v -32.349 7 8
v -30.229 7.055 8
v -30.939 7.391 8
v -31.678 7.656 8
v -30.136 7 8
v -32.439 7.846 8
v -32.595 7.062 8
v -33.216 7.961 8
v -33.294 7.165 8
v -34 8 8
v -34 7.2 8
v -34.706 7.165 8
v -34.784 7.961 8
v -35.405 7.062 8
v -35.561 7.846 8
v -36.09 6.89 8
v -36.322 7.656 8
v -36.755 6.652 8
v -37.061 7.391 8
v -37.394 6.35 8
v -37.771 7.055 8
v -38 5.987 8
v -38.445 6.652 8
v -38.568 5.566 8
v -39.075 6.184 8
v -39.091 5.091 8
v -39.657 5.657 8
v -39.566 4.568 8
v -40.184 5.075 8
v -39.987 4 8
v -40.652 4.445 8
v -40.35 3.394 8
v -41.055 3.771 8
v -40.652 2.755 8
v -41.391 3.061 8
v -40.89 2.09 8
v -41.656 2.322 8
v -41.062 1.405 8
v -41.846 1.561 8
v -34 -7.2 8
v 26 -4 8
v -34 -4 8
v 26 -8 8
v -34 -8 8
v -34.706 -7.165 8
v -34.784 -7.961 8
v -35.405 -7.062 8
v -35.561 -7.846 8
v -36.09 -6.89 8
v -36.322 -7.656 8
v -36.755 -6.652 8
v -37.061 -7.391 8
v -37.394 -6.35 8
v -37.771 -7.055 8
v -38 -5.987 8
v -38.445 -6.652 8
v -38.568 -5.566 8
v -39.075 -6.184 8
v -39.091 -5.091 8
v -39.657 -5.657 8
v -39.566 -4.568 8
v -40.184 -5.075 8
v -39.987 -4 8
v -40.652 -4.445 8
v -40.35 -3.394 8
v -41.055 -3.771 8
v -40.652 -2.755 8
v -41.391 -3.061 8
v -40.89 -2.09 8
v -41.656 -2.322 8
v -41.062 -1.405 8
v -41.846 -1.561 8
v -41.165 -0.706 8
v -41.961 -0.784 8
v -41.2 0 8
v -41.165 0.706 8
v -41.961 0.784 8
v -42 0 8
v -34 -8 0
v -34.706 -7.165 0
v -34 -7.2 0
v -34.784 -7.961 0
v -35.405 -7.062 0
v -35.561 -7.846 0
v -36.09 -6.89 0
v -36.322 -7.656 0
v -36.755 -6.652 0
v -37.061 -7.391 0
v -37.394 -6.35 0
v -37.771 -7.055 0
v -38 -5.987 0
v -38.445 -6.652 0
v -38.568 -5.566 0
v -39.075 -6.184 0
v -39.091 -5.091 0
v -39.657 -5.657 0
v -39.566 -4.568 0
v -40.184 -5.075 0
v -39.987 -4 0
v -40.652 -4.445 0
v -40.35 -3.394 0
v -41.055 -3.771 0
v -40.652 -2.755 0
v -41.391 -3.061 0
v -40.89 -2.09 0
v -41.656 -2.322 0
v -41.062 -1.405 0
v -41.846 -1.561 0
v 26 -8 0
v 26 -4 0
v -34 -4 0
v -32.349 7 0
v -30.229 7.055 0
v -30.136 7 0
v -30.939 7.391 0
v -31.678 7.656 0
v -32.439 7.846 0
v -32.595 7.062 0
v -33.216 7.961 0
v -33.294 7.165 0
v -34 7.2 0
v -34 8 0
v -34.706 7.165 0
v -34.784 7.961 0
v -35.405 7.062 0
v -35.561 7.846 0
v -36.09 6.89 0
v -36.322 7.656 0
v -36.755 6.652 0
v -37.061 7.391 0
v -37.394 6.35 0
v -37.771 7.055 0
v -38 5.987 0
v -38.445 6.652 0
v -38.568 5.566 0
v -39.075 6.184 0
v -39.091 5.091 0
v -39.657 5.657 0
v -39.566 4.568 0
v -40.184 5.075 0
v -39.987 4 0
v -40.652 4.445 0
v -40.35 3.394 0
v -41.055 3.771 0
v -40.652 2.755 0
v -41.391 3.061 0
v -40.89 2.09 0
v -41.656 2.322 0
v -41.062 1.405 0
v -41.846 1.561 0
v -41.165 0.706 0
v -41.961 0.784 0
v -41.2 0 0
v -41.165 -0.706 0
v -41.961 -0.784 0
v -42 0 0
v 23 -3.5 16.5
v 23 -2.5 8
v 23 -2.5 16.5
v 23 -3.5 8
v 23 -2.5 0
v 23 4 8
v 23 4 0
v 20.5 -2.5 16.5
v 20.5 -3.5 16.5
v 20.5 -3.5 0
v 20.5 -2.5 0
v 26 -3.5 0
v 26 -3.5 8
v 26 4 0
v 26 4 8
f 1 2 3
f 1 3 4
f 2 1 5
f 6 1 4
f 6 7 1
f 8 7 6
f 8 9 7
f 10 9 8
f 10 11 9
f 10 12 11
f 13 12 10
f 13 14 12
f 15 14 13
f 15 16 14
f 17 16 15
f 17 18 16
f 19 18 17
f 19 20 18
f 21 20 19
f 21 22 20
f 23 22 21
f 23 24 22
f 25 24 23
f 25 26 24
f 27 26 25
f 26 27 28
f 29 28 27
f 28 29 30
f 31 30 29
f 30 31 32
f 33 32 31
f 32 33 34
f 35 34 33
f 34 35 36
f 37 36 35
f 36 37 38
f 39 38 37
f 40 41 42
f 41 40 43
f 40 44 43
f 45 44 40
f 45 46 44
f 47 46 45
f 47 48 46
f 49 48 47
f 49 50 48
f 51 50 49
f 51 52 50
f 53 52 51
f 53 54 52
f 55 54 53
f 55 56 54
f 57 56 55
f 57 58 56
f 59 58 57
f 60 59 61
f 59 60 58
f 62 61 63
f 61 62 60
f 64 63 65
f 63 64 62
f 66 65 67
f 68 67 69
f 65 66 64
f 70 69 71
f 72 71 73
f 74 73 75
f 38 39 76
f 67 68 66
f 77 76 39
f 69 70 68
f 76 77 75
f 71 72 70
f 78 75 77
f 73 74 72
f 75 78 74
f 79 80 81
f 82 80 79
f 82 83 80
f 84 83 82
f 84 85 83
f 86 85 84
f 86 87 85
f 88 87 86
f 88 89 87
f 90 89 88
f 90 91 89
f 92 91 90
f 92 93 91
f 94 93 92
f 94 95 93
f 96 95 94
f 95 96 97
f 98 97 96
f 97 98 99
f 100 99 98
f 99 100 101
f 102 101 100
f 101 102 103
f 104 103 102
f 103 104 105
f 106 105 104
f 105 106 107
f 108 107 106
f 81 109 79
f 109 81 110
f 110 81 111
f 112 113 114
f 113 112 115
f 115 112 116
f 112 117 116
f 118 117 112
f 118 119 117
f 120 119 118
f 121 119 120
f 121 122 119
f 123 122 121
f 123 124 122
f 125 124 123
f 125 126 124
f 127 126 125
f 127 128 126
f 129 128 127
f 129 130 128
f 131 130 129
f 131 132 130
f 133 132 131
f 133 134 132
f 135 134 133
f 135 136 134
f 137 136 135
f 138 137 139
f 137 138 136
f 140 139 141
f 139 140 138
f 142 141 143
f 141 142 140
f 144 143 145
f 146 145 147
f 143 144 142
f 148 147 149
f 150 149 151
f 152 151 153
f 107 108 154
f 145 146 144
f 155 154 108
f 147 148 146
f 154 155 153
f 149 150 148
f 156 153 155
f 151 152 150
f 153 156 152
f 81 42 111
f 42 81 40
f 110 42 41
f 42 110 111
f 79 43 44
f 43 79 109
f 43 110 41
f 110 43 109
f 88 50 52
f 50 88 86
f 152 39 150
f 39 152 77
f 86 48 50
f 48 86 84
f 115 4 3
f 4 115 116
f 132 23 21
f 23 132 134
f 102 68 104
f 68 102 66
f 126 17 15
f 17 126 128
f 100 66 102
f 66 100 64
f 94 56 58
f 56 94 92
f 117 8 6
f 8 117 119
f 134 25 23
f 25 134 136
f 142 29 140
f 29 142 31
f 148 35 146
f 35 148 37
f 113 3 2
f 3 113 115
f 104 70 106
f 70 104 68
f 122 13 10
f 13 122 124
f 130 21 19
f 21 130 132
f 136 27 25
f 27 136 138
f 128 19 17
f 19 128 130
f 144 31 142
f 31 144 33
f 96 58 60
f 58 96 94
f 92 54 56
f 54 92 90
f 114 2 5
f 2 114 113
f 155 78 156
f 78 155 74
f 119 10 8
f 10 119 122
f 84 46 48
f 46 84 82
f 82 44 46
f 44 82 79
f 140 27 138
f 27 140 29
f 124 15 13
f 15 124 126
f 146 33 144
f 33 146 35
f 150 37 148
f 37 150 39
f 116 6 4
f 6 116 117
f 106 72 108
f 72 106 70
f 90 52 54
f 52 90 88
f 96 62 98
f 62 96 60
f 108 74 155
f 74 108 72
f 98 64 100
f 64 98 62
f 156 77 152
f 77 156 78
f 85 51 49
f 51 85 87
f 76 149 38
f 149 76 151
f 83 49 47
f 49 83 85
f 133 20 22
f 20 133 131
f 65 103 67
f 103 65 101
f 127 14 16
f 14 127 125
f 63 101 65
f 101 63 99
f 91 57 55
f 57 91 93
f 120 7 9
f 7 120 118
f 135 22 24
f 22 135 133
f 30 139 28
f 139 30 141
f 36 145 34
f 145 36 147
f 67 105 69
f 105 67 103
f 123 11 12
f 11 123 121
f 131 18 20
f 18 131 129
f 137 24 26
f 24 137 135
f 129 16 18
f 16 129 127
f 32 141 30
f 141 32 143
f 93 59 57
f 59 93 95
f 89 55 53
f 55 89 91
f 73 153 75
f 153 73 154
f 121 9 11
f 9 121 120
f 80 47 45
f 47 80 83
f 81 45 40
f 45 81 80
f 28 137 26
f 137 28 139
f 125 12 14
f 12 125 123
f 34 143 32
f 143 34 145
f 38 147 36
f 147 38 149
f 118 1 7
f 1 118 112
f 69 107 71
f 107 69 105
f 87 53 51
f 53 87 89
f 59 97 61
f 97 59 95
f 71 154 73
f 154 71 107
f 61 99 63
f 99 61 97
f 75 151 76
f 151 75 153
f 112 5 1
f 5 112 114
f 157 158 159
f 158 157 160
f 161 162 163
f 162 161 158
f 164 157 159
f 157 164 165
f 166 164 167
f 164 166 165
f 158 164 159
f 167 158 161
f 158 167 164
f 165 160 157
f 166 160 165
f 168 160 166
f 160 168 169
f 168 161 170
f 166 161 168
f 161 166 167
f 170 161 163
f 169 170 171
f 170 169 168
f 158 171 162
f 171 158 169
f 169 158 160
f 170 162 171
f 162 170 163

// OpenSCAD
// --- Dimensions ---
// Lower Jaw
jaw_lower_len = 50;          // Length of main lower bar
jaw_lower_width = 4;         // Width of main lower bar
tongue_len = 6;              // Length of the tongue part
tongue_start_x = 50;         // X position where tongue starts
tongue_y_min = 2.5;          // Y position of tongue bottom
tongue_y_max = 4;            // Y position of tongue top

// Upper Jaw
jaw_upper_len = 60;          // Length of upper bar
jaw_upper_y_min = 12;        // Y position of upper bar bottom
jaw_upper_y_max = 16;        // Y position of upper bar top

// Hinge (Half-ring)
hinge_center_x = 0;          // X center of hinge
hinge_center_y = 8;          // Y center of hinge
hinge_r_inner = 7.2;         // Inner radius of hinge
hinge_r_outer = 8.0;         // Outer radius of hinge

// Pinch Ridges
ridge_radius = 1.5;          // Radius of the half-round ridge
ridge_x_pos = 27.5;          // X position of the ridge

// Latch
latch_leg_x_min = 57;         // X start of latch leg
latch_leg_x_max = 60;         // X end of latch leg
latch_leg_y_min = 4.5;        // Y start of latch leg
latch_leg_y_max = 12;         // Y end of latch leg
latch_nose_x_min = 54.5;      // X start of latch nose
latch_nose_x_max = 57;        // X end of latch nose
latch_nose_y_min = 4.5;       // Y start of latch nose
latch_nose_y_max = 5.5;       // Y end of latch nose
latch_offset_z = 0.5;        // Z offset for the nose relative to tongue

// General
thickness = 8;               // Extrusion depth (Z)
$fn = 64;                    // Smoothness

// --- Construction ---

module pinch_clamp() {
    // To ensure a single watertight solid, we use union() on all components.
    // The "nose" is part of the 2D profile extruded 8mm, but the prompt 
    // specifies it is "0.5mm above the tongue". 
    // To satisfy "one 2-D profile extruded 8mm" and "0.5mm above", 
    // the nose must be a feature on the Z-axis. 
    // To make it one solid, we connect the nose to the leg.
    
    union() {
        // 1. Lower Jaw (Main Bar + Tongue)
        difference() {
            union() {
                // Main bar
                cube([jaw_lower_len, jaw_lower_width, thickness]);
                // Tongue
                translate([tongue_start_x, tongue_y_min, 0])
                    cube([tongue_len, tongue_y_max - tongue_y_min, thickness]);
            }
            
            // Lower Ridge Cutout (Half-round)
            // Inner face of lower jaw is at y = 4
            translate([ridge_x_pos, jaw_lower_width, thickness/2])
                rotate([0, 90, 0])
                    cylinder(r = ridge_radius, h = jaw_lower_len + 2, center = true);
        }

        // 2. Upper Jaw
        difference() {
            cube([jaw_upper_len, jaw_upper_y_max - jaw_upper_y_min, thickness]);
            
            // Upper Ridge Cutout (Half-round)
            // Inner face of upper jaw is at y = 12
            translate([ridge_x_pos, jaw_upper_y_min, thickness/2])
                rotate([0, 90, 0])
                    cylinder(r = ridge_radius, h = jaw_upper_len + 2, center = true);
        }

        // 3. Hinge (Half-ring)
        difference() {
            translate([hinge_center_x, hinge_center_y, 0])
                cylinder(r = hinge_r_outer, h = thickness);
            translate([hinge_center_x, hinge_center_y, -1])
                cylinder(r = hinge_r_inner, h = thickness + 2);
            // Cut the right half to make it a half-ring on the left side
            translate([hinge_center_x, hinge_center_y - hinge_r_outer - 1, -1])
                cube([hinge_r_outer * 2 + 2, hinge_r_outer * 2, thickness + 2]);
        }

        // 4. Latch Leg
        translate([latch_leg_x_min, latch_leg_y_min, 0])
            cube([latch_leg_x_max - latch_leg_x_min, latch_leg_y_max - latch_leg_y_min, thickness]);

        // 5. Latch Nose + Connector
        // To make it one solid, we extrude the nose and connect it to the leg.
        // The nose is 0.5mm above the tongue (Z=8).
        union() {
            // The nose itself
            translate([latch_nose_x_min, latch_nose_y_min, thickness + latch_offset_z])
                cube([latch_nose_x_max - latch_nose_x_min, latch_nose_y_max - latch_nose_y_min, thickness]);
            
            // Vertical connector to join nose to the leg (making it 1 body)
            translate([latch_nose_x_min, latch_nose_y_min, 0])
                cube([latch_nose_x_max - latch_nose_x_min, latch_nose_y_max - latch_nose_y_min, thickness + latch_offset_z]);
        }
    }
}

// Render the part
// Centered on origin in X and Y.
// Bounding box calculation:
// X: hinge is at -8 to 0, jaws go to 60. Total X = 68. Center = 34.
// Y: 0 to 16. Center = 8.
translate([-34, -8, 0])
    pinch_clamp();
